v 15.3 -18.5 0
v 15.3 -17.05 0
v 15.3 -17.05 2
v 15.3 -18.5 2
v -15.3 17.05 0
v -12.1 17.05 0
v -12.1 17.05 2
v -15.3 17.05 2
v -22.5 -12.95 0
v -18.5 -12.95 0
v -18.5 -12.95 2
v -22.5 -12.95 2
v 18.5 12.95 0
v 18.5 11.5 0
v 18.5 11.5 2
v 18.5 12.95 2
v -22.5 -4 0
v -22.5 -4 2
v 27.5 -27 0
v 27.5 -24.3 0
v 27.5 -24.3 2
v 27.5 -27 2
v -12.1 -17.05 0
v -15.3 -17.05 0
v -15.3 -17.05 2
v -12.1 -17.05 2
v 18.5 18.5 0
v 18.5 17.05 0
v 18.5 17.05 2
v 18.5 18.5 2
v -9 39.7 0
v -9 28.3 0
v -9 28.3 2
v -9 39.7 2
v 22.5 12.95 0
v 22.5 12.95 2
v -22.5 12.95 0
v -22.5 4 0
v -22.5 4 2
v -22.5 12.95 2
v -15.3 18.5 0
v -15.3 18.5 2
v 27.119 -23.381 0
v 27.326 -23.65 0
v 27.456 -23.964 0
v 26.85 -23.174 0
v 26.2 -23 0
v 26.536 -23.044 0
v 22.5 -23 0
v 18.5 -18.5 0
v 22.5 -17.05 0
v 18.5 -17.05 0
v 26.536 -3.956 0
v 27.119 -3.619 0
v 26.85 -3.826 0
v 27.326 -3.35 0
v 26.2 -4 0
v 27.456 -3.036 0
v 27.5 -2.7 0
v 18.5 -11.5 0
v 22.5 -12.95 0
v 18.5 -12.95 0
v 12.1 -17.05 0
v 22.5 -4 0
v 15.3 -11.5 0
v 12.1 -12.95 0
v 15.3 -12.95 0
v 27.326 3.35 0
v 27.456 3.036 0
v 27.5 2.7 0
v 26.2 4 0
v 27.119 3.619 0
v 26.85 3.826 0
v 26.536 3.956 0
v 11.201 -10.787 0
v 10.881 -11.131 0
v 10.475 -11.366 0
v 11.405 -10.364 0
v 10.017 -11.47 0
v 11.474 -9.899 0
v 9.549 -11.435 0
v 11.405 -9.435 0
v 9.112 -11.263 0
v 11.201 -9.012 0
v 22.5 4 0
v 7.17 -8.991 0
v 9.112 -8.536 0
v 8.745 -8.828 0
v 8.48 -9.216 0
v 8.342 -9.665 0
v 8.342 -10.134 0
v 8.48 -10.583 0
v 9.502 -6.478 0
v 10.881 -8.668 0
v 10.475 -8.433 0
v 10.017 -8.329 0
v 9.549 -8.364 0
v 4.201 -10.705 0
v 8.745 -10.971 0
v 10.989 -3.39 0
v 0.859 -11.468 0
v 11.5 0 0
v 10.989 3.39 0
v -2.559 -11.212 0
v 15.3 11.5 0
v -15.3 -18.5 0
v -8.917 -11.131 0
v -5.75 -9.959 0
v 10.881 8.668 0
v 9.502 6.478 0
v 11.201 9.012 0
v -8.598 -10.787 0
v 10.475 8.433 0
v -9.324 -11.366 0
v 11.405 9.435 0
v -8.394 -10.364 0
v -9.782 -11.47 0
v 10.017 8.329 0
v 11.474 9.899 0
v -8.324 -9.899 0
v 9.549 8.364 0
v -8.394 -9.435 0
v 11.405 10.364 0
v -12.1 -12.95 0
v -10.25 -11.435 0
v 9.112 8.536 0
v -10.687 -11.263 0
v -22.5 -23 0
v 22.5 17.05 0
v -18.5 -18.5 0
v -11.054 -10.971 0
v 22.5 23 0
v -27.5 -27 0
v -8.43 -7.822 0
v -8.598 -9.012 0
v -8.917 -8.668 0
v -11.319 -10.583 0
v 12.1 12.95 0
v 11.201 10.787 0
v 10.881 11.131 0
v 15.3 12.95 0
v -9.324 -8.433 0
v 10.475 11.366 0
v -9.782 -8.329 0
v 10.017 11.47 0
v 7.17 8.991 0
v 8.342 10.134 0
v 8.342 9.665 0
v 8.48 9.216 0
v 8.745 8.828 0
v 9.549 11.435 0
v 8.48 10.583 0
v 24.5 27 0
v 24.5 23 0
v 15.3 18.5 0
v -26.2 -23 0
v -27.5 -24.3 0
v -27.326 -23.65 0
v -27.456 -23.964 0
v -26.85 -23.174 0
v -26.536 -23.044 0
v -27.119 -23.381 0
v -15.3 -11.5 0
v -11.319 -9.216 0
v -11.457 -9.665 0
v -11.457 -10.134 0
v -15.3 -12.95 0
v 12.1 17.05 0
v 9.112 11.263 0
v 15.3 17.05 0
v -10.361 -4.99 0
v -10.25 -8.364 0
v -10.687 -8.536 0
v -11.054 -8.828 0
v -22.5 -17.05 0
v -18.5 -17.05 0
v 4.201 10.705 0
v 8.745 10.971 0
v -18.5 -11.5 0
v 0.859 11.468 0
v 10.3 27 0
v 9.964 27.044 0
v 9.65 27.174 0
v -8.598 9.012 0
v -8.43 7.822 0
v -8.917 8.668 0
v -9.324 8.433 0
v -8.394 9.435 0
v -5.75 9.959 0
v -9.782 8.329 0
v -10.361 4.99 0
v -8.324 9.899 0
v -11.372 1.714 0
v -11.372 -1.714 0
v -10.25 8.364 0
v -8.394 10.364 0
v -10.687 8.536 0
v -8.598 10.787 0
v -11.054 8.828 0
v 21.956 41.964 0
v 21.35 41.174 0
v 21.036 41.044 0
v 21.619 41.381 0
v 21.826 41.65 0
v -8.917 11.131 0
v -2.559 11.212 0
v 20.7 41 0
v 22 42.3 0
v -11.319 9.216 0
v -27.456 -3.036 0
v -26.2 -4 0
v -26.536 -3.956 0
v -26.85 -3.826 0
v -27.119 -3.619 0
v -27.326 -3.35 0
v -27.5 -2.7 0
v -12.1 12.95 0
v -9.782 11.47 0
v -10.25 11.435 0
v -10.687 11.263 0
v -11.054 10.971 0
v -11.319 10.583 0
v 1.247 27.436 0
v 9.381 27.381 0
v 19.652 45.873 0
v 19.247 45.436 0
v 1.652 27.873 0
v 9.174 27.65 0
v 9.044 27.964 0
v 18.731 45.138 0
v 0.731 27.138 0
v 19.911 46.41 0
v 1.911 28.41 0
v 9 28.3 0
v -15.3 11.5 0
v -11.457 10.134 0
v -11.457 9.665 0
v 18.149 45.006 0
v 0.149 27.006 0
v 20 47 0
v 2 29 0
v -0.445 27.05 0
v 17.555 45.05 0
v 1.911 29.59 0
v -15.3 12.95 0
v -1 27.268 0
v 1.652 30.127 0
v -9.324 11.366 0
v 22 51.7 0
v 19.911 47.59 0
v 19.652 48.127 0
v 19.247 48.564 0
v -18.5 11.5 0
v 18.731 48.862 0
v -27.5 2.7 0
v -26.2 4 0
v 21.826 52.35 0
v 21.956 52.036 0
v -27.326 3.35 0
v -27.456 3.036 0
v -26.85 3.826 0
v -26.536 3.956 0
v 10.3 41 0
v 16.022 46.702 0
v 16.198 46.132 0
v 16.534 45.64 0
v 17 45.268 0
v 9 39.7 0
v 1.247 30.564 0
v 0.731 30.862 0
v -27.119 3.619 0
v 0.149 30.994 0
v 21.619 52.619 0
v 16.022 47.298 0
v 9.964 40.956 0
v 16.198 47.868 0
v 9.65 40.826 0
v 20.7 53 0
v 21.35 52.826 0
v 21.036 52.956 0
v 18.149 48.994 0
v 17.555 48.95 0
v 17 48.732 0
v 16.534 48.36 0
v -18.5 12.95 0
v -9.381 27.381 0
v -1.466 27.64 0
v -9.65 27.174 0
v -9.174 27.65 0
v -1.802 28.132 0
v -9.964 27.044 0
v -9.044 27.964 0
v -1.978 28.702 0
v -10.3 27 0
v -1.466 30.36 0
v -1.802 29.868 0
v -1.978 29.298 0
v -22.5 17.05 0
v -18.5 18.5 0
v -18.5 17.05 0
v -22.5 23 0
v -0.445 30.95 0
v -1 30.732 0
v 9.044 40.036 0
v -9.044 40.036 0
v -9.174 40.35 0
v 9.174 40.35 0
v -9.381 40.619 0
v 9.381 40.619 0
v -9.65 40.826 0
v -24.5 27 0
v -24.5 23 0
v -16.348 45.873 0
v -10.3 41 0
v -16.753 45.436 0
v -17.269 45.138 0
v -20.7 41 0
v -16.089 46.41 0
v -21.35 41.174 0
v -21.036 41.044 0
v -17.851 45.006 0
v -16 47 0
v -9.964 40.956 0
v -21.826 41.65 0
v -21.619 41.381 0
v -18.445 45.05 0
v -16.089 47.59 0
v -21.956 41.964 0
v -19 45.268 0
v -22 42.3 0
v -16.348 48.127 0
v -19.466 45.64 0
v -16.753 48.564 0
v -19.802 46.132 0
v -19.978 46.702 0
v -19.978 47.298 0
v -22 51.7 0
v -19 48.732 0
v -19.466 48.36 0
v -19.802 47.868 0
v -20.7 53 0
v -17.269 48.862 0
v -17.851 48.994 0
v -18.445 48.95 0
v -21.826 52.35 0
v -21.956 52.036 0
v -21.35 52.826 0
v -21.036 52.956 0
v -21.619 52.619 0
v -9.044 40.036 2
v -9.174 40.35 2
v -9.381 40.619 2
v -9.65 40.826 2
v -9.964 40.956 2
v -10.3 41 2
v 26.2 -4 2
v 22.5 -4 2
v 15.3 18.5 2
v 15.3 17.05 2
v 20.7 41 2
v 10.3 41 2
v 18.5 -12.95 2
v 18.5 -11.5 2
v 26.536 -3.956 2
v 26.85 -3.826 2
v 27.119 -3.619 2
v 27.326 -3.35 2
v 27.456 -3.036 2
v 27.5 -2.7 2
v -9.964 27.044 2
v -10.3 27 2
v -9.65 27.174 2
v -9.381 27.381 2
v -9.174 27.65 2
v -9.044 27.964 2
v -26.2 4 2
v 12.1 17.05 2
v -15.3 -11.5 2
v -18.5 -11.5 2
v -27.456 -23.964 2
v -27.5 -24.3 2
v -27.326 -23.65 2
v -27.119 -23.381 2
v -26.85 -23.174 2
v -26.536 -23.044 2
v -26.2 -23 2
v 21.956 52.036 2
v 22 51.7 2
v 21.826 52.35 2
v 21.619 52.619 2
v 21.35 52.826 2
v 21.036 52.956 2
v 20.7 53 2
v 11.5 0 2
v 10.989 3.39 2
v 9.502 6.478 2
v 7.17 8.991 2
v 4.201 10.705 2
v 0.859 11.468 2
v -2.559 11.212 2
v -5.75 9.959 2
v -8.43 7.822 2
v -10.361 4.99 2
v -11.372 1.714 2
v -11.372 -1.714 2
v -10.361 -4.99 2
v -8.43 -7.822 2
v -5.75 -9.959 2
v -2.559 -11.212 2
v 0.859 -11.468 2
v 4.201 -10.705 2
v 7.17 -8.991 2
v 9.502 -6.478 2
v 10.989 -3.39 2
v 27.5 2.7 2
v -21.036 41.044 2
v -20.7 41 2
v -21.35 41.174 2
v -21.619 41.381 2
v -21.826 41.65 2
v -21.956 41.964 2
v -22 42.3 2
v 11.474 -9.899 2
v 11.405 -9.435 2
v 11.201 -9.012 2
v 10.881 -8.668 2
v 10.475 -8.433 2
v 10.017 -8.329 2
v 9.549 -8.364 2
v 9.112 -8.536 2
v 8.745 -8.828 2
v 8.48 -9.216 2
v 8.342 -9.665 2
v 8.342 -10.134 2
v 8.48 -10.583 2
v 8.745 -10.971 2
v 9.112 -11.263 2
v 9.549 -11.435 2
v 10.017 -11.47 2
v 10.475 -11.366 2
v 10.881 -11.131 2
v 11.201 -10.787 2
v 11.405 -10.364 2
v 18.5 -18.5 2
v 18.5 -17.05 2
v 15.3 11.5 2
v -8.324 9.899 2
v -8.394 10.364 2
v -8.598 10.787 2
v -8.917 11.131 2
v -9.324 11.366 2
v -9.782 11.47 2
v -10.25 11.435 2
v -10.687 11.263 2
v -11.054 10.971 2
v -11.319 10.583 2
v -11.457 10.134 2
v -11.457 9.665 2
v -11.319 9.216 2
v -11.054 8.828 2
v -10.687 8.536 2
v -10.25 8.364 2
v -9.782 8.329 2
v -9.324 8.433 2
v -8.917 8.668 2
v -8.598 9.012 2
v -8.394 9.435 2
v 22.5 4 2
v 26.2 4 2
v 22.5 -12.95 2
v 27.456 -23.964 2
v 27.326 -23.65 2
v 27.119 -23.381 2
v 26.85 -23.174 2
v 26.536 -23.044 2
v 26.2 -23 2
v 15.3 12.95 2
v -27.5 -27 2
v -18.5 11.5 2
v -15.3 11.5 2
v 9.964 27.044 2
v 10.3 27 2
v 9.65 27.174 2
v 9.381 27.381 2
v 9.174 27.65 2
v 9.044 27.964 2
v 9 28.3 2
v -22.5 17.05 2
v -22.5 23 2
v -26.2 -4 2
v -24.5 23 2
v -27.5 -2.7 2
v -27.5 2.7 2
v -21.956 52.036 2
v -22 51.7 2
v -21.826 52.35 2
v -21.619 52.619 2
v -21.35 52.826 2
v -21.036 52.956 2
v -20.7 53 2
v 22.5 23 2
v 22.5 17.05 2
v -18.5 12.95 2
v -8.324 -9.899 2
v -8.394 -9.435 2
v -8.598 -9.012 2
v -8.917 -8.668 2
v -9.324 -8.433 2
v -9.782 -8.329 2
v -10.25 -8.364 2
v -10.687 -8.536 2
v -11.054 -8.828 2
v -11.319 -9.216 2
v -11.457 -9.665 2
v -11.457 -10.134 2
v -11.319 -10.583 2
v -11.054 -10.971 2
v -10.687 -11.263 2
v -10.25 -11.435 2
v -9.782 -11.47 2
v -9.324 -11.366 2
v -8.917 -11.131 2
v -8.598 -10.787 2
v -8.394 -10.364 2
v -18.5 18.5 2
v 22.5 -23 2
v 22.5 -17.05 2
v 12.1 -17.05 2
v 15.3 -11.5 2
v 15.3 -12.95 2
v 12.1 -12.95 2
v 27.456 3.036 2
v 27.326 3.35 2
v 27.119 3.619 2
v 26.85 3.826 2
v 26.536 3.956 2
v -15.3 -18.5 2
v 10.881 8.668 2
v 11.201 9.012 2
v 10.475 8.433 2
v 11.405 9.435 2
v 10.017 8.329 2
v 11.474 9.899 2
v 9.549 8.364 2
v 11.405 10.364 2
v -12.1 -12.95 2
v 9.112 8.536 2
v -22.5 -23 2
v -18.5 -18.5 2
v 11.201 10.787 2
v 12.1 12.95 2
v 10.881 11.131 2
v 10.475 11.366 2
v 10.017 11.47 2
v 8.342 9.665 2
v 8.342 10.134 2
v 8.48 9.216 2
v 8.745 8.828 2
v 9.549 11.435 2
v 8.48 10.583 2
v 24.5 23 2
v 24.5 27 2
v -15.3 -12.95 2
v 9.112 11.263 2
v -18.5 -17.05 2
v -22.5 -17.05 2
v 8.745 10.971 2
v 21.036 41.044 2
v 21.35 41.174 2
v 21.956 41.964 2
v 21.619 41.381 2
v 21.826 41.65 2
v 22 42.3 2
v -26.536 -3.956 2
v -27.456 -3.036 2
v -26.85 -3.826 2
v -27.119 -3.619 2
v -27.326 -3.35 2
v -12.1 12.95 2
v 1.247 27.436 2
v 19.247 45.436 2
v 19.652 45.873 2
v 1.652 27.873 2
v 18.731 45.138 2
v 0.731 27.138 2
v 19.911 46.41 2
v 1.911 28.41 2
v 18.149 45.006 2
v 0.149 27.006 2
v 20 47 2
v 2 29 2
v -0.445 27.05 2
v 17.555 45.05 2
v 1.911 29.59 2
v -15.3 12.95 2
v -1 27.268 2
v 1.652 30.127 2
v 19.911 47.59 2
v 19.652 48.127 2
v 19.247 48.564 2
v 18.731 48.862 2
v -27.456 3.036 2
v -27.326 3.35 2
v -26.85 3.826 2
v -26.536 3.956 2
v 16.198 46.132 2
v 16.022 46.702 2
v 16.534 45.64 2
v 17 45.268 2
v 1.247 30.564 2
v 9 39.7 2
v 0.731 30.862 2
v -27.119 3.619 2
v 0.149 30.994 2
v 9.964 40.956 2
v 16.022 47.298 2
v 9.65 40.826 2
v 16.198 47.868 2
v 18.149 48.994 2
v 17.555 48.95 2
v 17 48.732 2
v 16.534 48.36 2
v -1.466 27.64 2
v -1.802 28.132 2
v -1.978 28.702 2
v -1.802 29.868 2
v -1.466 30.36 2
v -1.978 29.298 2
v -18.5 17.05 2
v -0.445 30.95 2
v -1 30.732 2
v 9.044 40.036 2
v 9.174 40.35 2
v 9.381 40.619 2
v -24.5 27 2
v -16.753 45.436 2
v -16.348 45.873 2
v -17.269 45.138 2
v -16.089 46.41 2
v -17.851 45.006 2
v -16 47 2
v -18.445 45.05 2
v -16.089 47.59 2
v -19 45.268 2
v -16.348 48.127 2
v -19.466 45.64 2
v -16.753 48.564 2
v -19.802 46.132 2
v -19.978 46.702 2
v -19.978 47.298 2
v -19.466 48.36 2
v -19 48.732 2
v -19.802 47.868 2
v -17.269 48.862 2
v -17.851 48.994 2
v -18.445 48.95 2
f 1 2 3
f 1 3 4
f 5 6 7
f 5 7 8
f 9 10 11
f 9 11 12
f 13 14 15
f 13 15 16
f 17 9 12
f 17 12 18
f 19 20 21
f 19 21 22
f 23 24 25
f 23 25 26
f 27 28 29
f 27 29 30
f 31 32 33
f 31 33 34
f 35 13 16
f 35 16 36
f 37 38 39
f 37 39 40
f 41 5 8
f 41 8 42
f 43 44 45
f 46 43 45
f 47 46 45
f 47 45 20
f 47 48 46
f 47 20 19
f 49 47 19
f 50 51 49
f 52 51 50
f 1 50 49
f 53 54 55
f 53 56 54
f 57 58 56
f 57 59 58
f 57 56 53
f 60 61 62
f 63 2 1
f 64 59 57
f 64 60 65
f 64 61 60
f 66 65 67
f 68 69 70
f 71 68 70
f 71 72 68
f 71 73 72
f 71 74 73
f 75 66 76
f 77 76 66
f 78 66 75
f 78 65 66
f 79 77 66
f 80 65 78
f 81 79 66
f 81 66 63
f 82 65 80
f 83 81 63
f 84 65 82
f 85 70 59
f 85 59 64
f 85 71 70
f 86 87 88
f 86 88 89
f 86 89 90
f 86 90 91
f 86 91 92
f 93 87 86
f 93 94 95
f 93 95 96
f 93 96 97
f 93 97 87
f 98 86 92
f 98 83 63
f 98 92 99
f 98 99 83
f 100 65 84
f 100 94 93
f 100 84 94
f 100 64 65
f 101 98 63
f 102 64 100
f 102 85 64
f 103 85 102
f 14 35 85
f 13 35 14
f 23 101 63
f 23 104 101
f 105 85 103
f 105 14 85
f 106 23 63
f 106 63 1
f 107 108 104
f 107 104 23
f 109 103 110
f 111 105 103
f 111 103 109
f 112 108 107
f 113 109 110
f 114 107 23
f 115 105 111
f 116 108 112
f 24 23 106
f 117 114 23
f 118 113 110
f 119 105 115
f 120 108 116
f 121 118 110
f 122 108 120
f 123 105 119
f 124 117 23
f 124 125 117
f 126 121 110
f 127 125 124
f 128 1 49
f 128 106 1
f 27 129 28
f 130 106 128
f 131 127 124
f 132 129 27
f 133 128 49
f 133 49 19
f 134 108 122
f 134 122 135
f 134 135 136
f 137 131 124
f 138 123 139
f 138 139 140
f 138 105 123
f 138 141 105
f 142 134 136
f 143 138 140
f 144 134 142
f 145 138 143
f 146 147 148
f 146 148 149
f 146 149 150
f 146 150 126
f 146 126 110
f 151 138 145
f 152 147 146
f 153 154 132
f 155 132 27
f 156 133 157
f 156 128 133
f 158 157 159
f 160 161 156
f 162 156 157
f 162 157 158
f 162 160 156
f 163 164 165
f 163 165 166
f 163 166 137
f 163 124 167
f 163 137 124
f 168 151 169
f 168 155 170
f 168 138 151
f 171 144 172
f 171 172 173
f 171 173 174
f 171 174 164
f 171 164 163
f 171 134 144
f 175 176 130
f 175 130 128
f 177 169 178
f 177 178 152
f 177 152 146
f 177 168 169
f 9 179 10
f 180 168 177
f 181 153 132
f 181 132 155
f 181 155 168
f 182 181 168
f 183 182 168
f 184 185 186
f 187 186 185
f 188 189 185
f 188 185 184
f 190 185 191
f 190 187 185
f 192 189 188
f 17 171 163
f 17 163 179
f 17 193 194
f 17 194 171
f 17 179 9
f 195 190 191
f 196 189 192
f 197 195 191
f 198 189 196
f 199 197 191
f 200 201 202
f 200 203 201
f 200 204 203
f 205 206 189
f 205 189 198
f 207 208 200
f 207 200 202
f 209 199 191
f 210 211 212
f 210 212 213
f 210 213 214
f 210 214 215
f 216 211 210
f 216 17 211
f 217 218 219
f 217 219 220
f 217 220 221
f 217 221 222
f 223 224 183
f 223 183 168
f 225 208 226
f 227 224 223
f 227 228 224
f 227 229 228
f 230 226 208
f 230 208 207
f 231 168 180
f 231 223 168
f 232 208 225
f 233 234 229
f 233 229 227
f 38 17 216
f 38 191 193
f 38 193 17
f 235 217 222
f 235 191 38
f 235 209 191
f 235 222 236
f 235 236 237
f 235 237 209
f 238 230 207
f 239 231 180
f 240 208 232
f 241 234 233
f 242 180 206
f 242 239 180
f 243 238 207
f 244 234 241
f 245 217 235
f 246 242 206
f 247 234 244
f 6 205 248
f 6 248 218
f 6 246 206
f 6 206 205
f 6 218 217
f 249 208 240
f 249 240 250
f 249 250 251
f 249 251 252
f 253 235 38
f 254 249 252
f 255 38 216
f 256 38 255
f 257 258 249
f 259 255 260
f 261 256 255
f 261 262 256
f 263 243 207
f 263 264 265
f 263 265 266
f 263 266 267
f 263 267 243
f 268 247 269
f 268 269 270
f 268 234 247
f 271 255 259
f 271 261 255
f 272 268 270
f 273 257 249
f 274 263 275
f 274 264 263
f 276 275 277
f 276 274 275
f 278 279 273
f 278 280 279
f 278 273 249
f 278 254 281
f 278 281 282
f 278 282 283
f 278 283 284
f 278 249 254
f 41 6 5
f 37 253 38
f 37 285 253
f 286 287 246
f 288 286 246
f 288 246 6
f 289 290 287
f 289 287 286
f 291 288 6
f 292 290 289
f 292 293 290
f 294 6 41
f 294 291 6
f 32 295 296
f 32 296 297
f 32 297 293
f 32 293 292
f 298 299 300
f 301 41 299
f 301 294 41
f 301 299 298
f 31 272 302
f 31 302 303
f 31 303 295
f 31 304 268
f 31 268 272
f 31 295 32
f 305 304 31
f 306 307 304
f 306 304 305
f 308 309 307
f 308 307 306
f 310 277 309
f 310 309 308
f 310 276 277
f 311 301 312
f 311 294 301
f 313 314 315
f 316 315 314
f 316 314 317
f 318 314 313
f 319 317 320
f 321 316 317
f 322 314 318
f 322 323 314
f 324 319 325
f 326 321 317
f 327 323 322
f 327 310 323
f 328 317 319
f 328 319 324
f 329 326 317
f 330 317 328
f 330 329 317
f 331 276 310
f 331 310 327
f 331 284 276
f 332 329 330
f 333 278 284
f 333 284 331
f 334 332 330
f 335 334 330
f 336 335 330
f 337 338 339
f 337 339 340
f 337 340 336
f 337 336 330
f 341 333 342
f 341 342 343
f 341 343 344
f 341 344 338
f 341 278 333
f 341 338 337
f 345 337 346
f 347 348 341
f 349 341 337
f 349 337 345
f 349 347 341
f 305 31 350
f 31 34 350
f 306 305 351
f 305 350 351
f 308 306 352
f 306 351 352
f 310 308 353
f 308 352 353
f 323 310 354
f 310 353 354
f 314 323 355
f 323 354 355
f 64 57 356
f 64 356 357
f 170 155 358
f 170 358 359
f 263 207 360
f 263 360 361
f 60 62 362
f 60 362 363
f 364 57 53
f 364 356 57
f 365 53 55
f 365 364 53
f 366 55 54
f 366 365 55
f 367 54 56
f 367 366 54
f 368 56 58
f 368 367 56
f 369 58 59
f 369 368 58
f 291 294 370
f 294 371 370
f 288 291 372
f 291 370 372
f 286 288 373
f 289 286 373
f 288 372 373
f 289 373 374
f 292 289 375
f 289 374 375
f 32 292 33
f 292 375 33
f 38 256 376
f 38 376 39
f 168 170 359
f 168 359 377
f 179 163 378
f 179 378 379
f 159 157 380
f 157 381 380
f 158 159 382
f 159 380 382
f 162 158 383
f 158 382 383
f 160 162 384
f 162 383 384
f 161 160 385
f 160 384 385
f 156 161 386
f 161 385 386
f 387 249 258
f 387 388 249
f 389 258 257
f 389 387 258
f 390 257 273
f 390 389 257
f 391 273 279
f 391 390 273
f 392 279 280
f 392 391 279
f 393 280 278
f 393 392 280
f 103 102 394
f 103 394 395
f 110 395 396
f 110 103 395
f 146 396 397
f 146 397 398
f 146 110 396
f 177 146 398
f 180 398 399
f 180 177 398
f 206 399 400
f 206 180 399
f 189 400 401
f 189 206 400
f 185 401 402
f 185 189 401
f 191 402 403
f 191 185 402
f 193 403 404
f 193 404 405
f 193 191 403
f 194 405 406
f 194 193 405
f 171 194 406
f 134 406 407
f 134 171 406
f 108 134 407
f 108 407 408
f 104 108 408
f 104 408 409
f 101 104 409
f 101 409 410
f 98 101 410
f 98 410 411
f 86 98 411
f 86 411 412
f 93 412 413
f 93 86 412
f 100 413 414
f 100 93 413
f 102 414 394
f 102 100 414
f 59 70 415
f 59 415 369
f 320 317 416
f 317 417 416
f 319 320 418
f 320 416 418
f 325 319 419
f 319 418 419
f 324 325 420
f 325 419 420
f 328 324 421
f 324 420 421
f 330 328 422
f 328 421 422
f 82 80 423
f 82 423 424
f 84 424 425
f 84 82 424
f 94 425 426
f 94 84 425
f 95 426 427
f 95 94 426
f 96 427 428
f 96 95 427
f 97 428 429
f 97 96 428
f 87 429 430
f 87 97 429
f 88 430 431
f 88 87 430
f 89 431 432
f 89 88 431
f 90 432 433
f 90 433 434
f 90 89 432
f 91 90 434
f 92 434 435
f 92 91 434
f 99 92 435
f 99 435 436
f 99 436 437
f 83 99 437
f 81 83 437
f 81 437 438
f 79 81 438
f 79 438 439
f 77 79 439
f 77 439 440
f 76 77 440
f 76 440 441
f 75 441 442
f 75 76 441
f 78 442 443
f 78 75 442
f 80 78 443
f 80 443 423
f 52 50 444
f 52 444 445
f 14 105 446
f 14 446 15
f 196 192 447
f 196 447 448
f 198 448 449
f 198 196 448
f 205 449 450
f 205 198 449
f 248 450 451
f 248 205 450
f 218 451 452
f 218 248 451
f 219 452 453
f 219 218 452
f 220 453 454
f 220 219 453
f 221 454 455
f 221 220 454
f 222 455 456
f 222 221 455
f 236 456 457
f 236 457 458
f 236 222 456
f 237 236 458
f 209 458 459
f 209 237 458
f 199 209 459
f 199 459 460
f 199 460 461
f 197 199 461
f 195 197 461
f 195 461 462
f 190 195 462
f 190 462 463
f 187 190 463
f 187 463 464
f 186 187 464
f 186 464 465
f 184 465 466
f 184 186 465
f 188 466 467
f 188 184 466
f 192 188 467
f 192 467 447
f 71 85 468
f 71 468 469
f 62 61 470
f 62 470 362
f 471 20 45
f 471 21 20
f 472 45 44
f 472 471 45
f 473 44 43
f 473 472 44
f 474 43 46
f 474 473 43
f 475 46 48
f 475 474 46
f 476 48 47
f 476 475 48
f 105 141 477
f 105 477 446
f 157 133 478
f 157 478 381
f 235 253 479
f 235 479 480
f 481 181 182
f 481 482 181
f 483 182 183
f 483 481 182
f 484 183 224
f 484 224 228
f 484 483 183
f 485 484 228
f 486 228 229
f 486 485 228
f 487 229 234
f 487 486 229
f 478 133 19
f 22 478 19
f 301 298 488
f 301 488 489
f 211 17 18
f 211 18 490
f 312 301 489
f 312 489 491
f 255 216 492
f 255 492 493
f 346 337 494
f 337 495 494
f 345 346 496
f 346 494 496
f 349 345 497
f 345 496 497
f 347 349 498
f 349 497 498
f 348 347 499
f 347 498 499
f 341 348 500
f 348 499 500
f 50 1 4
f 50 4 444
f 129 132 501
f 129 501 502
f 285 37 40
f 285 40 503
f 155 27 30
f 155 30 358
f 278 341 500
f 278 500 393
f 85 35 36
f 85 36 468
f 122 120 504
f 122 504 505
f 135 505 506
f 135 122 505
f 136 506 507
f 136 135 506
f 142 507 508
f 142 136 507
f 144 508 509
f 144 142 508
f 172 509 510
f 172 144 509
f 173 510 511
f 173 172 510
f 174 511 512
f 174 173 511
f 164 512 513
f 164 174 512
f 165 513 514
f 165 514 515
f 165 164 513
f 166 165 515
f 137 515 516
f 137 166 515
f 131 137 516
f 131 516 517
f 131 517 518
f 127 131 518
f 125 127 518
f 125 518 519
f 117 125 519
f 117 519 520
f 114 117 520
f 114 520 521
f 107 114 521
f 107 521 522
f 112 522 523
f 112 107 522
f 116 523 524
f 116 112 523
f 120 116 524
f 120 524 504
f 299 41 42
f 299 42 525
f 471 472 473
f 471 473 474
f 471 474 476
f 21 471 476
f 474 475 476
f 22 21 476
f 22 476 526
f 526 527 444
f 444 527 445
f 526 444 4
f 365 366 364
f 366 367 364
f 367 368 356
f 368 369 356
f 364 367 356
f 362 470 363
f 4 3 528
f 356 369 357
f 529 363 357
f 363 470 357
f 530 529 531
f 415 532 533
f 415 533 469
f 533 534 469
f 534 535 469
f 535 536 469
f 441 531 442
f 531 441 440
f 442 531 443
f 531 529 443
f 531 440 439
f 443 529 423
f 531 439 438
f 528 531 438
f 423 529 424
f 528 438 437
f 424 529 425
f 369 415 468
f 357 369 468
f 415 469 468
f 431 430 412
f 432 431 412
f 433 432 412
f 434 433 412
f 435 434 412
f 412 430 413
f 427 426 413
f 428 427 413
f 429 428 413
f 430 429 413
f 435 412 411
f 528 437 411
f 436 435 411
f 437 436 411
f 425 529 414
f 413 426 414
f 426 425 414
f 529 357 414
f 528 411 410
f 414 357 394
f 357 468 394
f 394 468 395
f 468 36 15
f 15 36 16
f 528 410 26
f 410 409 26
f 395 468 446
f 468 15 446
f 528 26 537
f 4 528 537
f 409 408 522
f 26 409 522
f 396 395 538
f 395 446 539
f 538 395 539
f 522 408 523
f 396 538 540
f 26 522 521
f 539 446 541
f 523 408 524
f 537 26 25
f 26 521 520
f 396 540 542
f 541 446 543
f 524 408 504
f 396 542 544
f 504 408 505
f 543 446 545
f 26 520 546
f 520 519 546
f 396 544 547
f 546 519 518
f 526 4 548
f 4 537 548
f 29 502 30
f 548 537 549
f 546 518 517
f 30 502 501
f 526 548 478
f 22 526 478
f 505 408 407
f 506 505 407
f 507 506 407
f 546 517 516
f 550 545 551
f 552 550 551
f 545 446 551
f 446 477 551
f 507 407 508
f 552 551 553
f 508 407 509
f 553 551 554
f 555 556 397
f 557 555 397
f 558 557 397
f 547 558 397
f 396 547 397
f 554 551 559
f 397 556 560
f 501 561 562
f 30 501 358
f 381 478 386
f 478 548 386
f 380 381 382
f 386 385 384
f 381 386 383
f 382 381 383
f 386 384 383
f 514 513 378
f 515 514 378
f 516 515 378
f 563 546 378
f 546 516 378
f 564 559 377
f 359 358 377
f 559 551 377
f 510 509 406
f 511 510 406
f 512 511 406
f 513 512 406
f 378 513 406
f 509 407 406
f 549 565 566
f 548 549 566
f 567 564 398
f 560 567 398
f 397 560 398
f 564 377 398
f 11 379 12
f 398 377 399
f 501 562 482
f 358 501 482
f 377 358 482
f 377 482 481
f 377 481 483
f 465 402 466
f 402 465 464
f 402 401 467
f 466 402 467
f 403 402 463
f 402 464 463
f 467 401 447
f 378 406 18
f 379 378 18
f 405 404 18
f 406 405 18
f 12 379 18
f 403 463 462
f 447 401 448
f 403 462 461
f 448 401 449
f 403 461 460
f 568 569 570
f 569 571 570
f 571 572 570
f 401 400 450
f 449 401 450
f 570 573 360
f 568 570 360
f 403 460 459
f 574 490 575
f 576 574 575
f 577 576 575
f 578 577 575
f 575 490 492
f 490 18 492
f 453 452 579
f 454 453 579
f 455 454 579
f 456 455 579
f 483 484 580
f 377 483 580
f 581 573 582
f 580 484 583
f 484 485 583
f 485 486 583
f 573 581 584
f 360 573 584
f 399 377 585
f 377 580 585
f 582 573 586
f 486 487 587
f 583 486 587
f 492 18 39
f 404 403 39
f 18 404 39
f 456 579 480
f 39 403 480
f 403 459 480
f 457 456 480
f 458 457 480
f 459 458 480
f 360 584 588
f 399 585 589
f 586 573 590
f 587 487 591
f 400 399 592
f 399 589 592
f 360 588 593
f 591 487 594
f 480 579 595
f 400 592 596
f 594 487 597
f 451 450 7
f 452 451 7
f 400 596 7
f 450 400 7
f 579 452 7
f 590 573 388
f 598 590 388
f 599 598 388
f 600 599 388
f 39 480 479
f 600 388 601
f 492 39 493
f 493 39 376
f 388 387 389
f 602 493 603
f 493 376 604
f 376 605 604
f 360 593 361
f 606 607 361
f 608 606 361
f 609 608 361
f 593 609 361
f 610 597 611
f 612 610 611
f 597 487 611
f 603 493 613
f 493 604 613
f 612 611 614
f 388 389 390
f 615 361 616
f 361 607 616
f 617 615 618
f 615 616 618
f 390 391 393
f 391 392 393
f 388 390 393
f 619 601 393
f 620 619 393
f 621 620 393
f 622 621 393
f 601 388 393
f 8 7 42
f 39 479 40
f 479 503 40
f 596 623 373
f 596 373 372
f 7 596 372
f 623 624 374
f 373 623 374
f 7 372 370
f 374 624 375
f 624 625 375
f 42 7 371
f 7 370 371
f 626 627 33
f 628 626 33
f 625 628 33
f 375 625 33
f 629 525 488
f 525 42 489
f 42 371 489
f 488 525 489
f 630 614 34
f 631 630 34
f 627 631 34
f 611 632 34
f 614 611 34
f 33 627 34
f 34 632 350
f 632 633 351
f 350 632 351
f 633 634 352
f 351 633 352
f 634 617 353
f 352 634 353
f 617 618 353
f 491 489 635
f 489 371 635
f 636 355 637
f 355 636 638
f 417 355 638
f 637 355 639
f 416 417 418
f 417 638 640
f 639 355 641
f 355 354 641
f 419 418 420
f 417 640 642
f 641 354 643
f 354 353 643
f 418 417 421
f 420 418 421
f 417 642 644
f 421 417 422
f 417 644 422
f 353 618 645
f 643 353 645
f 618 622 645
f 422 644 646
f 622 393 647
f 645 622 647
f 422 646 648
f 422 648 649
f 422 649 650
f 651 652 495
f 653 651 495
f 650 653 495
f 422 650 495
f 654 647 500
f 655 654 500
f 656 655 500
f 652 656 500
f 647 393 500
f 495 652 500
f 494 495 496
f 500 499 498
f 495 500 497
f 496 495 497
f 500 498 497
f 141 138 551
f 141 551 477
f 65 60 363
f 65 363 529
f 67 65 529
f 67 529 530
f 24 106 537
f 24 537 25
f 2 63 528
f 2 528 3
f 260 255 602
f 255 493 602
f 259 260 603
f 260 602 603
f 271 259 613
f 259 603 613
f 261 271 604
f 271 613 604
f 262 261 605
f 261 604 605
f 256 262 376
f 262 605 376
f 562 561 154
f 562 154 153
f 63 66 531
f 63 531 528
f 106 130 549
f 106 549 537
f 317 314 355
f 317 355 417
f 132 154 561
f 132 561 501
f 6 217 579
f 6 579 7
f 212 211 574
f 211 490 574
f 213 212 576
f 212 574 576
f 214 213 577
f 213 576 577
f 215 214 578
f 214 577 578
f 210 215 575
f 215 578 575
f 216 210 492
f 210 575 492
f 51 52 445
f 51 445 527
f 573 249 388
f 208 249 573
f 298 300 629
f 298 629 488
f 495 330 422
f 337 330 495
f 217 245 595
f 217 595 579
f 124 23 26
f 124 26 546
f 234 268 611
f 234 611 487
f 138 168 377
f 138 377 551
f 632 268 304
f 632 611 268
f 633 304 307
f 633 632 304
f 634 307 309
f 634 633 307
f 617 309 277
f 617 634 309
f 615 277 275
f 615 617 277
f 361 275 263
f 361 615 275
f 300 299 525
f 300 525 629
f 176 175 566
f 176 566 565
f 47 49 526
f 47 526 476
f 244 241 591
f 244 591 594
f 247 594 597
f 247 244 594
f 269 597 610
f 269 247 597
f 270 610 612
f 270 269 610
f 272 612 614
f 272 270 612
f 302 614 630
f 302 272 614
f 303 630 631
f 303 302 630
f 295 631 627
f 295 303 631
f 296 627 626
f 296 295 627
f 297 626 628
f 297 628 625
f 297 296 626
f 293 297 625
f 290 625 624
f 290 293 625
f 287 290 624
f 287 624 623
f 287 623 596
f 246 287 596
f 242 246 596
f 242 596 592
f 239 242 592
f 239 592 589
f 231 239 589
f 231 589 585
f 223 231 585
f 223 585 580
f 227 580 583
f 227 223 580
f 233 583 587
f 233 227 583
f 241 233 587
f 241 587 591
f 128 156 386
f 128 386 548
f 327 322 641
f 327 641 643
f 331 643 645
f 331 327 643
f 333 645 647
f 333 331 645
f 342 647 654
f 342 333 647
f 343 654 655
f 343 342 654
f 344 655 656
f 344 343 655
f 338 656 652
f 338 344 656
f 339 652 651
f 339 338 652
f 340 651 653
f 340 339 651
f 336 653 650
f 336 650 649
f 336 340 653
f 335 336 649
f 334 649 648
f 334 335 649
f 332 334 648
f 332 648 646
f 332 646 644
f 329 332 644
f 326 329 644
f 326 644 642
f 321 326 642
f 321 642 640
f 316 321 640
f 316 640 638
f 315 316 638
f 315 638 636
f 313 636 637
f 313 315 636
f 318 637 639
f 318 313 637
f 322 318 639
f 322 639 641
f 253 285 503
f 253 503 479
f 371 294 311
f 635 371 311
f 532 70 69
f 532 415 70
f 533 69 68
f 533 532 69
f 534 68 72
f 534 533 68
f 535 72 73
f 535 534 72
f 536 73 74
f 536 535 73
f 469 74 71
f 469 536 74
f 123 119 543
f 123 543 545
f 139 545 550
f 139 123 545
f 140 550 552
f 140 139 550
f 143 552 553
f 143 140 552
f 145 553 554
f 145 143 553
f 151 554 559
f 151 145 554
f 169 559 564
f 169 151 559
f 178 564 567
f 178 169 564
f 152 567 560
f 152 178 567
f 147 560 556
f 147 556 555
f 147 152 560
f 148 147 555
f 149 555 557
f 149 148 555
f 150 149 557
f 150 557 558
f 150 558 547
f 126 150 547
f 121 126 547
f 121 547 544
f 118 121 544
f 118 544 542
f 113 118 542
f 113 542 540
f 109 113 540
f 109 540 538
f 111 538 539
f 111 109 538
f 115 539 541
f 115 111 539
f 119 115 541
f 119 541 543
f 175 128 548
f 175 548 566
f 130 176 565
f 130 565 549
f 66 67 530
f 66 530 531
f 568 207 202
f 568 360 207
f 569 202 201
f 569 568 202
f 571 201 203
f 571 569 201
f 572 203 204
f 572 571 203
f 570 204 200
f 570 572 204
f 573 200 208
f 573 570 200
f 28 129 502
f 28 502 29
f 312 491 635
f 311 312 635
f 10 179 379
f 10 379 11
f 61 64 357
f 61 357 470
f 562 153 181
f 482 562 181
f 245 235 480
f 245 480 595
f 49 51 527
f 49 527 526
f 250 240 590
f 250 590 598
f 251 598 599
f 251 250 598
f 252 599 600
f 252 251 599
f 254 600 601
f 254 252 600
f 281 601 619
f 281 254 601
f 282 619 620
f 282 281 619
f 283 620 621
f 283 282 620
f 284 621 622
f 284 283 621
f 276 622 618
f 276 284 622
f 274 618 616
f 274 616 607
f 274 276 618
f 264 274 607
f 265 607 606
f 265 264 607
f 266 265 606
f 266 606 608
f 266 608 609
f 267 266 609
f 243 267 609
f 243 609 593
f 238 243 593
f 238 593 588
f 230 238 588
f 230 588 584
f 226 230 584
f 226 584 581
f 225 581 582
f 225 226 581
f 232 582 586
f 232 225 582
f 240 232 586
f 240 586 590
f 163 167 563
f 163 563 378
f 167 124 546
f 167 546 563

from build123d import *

# Parameters (mm, degrees)
SKETCH_1_R          = 1.575
SKETCH_1_R_2        = 11.5
SKETCH_1_R_3        = 2
EXTRUDE_1_DEPTH     = 2
FILLET_1_R          = 1.3
SKETCH_4_W          = 3
SKETCH_4_H          = 5.878615105
SKETCH_4_H_2        = 11.344283934
CUT_EXTRUDE_1_DEPTH = 2


with BuildPart() as part:
    # 草图1 → 凸台-拉伸1 (new body)
    with BuildSketch(Plane.XY):
        Polygon((22.5, -27), (-22.5, -27), (-27.5, -27), (-27.5, -23), (-22.5, -23), (-22.5, -17.05), (-18.5, -17.05), (-18.5, -18.5), (-15.3, -18.5), (-15.3, -17.05), (-12.1, -17.05), (-12.1, -12.95), (-15.3, -12.95), (-15.3, -11.5), (-18.5, -11.5), (-18.5, -12.95), (-22.5, -12.95), (-22.5, -4), (-27.5, -4), (-27.5, 4), (-22.5, 4), (-22.5, 12.95), (-18.5, 12.95), (-18.5, 11.5), (-15.3, 11.5), (-15.3, 12.95), (-12.1, 12.95), (-12.1, 17.05), (-15.3, 17.05), (-15.3, 18.5), (-18.5, 18.5), (-18.5, 17.05), (-22.5, 17.05), (-22.5, 23), (-27.5, 23), (-27.5, 27), (-22.5, 27), (-9, 27), (-9, 41), (-22, 41), (-22, 53), (22, 53), (22, 41), (9, 41), (9, 27), (22.5, 27), (27.5, 27), (27.5, 23), (22.5, 23), (22.5, 17.05), (18.5, 17.05), (18.5, 18.5), (15.3, 18.5), (15.3, 17.05), (12.1, 17.05), (12.1, 12.95), (15.3, 12.95), (15.3, 11.5), (18.5, 11.5), (18.5, 12.95), (22.5, 12.95), (22.5, 4), (27.5, 4), (27.5, -4), (22.5, -4), (22.5, -12.95), (18.5, -12.95), (18.5, -11.5), (15.3, -11.5), (15.3, -12.95), (12.1, -12.95), (12.1, -17.05), (15.3, -17.05), (15.3, -18.5), (18.5, -18.5), (18.5, -17.05), (22.5, -17.05), (22.5, -23), (27.5, -23), (27.5, -27), align=None)
        with Locations((9.899494937, 9.899494937)):
            Circle(SKETCH_1_R, mode=Mode.SUBTRACT)
        Circle(SKETCH_1_R_2, mode=Mode.SUBTRACT)
        with Locations((9.899494937, -9.899494937)):
            Circle(SKETCH_1_R, mode=Mode.SUBTRACT)
        with Locations((-9.899494937, -9.899494937)):
            Circle(SKETCH_1_R, mode=Mode.SUBTRACT)
        with Locations((-9.899494937, 9.899494937)):
            Circle(SKETCH_1_R, mode=Mode.SUBTRACT)
        with Locations((-18, 47)):
            Circle(SKETCH_1_R_3, mode=Mode.SUBTRACT)
        with Locations((18, 47)):
            Circle(SKETCH_1_R_3, mode=Mode.SUBTRACT)
        with Locations((0, 29)):
            Circle(SKETCH_1_R_3, mode=Mode.SUBTRACT)
    extrude(amount=EXTRUDE_1_DEPTH)

    # 圆角1
    fillet_1_edges = [part.edges().sort_by_distance(p)[0] for p in [
        (-9, 27, 1),
        (-9, 41, 1),
        (-22, 41, 1),
        (-22, 53, 1),
        (22, 53, 1),
        (22, 41, 1),
        (9, 41, 1),
        (9, 27, 1),
        (27.5, 23, 1),
        (27.5, 4, 1),
        (27.5, -4, 1),
        (27.5, -23, 1),
        (-27.5, -23, 1),
        (-27.5, -4, 1),
        (-27.5, 4, 1),
        (-27.5, 23, 1),
    ]]
    fillet(fillet_1_edges, radius=FILLET_1_R)

    # 草图4 → 切除-拉伸1 (cut)
    with BuildSketch(Plane.XY.offset(2)):
        with Locations((26, 24.060692448)):
            Rectangle(SKETCH_4_W, SKETCH_4_H)
        with Locations((-26, 21.327858033)):
            Rectangle(SKETCH_4_W, SKETCH_4_H_2)
    extrude(amount=-CUT_EXTRUDE_1_DEPTH, mode=Mode.SUBTRACT)


solid = part.part
